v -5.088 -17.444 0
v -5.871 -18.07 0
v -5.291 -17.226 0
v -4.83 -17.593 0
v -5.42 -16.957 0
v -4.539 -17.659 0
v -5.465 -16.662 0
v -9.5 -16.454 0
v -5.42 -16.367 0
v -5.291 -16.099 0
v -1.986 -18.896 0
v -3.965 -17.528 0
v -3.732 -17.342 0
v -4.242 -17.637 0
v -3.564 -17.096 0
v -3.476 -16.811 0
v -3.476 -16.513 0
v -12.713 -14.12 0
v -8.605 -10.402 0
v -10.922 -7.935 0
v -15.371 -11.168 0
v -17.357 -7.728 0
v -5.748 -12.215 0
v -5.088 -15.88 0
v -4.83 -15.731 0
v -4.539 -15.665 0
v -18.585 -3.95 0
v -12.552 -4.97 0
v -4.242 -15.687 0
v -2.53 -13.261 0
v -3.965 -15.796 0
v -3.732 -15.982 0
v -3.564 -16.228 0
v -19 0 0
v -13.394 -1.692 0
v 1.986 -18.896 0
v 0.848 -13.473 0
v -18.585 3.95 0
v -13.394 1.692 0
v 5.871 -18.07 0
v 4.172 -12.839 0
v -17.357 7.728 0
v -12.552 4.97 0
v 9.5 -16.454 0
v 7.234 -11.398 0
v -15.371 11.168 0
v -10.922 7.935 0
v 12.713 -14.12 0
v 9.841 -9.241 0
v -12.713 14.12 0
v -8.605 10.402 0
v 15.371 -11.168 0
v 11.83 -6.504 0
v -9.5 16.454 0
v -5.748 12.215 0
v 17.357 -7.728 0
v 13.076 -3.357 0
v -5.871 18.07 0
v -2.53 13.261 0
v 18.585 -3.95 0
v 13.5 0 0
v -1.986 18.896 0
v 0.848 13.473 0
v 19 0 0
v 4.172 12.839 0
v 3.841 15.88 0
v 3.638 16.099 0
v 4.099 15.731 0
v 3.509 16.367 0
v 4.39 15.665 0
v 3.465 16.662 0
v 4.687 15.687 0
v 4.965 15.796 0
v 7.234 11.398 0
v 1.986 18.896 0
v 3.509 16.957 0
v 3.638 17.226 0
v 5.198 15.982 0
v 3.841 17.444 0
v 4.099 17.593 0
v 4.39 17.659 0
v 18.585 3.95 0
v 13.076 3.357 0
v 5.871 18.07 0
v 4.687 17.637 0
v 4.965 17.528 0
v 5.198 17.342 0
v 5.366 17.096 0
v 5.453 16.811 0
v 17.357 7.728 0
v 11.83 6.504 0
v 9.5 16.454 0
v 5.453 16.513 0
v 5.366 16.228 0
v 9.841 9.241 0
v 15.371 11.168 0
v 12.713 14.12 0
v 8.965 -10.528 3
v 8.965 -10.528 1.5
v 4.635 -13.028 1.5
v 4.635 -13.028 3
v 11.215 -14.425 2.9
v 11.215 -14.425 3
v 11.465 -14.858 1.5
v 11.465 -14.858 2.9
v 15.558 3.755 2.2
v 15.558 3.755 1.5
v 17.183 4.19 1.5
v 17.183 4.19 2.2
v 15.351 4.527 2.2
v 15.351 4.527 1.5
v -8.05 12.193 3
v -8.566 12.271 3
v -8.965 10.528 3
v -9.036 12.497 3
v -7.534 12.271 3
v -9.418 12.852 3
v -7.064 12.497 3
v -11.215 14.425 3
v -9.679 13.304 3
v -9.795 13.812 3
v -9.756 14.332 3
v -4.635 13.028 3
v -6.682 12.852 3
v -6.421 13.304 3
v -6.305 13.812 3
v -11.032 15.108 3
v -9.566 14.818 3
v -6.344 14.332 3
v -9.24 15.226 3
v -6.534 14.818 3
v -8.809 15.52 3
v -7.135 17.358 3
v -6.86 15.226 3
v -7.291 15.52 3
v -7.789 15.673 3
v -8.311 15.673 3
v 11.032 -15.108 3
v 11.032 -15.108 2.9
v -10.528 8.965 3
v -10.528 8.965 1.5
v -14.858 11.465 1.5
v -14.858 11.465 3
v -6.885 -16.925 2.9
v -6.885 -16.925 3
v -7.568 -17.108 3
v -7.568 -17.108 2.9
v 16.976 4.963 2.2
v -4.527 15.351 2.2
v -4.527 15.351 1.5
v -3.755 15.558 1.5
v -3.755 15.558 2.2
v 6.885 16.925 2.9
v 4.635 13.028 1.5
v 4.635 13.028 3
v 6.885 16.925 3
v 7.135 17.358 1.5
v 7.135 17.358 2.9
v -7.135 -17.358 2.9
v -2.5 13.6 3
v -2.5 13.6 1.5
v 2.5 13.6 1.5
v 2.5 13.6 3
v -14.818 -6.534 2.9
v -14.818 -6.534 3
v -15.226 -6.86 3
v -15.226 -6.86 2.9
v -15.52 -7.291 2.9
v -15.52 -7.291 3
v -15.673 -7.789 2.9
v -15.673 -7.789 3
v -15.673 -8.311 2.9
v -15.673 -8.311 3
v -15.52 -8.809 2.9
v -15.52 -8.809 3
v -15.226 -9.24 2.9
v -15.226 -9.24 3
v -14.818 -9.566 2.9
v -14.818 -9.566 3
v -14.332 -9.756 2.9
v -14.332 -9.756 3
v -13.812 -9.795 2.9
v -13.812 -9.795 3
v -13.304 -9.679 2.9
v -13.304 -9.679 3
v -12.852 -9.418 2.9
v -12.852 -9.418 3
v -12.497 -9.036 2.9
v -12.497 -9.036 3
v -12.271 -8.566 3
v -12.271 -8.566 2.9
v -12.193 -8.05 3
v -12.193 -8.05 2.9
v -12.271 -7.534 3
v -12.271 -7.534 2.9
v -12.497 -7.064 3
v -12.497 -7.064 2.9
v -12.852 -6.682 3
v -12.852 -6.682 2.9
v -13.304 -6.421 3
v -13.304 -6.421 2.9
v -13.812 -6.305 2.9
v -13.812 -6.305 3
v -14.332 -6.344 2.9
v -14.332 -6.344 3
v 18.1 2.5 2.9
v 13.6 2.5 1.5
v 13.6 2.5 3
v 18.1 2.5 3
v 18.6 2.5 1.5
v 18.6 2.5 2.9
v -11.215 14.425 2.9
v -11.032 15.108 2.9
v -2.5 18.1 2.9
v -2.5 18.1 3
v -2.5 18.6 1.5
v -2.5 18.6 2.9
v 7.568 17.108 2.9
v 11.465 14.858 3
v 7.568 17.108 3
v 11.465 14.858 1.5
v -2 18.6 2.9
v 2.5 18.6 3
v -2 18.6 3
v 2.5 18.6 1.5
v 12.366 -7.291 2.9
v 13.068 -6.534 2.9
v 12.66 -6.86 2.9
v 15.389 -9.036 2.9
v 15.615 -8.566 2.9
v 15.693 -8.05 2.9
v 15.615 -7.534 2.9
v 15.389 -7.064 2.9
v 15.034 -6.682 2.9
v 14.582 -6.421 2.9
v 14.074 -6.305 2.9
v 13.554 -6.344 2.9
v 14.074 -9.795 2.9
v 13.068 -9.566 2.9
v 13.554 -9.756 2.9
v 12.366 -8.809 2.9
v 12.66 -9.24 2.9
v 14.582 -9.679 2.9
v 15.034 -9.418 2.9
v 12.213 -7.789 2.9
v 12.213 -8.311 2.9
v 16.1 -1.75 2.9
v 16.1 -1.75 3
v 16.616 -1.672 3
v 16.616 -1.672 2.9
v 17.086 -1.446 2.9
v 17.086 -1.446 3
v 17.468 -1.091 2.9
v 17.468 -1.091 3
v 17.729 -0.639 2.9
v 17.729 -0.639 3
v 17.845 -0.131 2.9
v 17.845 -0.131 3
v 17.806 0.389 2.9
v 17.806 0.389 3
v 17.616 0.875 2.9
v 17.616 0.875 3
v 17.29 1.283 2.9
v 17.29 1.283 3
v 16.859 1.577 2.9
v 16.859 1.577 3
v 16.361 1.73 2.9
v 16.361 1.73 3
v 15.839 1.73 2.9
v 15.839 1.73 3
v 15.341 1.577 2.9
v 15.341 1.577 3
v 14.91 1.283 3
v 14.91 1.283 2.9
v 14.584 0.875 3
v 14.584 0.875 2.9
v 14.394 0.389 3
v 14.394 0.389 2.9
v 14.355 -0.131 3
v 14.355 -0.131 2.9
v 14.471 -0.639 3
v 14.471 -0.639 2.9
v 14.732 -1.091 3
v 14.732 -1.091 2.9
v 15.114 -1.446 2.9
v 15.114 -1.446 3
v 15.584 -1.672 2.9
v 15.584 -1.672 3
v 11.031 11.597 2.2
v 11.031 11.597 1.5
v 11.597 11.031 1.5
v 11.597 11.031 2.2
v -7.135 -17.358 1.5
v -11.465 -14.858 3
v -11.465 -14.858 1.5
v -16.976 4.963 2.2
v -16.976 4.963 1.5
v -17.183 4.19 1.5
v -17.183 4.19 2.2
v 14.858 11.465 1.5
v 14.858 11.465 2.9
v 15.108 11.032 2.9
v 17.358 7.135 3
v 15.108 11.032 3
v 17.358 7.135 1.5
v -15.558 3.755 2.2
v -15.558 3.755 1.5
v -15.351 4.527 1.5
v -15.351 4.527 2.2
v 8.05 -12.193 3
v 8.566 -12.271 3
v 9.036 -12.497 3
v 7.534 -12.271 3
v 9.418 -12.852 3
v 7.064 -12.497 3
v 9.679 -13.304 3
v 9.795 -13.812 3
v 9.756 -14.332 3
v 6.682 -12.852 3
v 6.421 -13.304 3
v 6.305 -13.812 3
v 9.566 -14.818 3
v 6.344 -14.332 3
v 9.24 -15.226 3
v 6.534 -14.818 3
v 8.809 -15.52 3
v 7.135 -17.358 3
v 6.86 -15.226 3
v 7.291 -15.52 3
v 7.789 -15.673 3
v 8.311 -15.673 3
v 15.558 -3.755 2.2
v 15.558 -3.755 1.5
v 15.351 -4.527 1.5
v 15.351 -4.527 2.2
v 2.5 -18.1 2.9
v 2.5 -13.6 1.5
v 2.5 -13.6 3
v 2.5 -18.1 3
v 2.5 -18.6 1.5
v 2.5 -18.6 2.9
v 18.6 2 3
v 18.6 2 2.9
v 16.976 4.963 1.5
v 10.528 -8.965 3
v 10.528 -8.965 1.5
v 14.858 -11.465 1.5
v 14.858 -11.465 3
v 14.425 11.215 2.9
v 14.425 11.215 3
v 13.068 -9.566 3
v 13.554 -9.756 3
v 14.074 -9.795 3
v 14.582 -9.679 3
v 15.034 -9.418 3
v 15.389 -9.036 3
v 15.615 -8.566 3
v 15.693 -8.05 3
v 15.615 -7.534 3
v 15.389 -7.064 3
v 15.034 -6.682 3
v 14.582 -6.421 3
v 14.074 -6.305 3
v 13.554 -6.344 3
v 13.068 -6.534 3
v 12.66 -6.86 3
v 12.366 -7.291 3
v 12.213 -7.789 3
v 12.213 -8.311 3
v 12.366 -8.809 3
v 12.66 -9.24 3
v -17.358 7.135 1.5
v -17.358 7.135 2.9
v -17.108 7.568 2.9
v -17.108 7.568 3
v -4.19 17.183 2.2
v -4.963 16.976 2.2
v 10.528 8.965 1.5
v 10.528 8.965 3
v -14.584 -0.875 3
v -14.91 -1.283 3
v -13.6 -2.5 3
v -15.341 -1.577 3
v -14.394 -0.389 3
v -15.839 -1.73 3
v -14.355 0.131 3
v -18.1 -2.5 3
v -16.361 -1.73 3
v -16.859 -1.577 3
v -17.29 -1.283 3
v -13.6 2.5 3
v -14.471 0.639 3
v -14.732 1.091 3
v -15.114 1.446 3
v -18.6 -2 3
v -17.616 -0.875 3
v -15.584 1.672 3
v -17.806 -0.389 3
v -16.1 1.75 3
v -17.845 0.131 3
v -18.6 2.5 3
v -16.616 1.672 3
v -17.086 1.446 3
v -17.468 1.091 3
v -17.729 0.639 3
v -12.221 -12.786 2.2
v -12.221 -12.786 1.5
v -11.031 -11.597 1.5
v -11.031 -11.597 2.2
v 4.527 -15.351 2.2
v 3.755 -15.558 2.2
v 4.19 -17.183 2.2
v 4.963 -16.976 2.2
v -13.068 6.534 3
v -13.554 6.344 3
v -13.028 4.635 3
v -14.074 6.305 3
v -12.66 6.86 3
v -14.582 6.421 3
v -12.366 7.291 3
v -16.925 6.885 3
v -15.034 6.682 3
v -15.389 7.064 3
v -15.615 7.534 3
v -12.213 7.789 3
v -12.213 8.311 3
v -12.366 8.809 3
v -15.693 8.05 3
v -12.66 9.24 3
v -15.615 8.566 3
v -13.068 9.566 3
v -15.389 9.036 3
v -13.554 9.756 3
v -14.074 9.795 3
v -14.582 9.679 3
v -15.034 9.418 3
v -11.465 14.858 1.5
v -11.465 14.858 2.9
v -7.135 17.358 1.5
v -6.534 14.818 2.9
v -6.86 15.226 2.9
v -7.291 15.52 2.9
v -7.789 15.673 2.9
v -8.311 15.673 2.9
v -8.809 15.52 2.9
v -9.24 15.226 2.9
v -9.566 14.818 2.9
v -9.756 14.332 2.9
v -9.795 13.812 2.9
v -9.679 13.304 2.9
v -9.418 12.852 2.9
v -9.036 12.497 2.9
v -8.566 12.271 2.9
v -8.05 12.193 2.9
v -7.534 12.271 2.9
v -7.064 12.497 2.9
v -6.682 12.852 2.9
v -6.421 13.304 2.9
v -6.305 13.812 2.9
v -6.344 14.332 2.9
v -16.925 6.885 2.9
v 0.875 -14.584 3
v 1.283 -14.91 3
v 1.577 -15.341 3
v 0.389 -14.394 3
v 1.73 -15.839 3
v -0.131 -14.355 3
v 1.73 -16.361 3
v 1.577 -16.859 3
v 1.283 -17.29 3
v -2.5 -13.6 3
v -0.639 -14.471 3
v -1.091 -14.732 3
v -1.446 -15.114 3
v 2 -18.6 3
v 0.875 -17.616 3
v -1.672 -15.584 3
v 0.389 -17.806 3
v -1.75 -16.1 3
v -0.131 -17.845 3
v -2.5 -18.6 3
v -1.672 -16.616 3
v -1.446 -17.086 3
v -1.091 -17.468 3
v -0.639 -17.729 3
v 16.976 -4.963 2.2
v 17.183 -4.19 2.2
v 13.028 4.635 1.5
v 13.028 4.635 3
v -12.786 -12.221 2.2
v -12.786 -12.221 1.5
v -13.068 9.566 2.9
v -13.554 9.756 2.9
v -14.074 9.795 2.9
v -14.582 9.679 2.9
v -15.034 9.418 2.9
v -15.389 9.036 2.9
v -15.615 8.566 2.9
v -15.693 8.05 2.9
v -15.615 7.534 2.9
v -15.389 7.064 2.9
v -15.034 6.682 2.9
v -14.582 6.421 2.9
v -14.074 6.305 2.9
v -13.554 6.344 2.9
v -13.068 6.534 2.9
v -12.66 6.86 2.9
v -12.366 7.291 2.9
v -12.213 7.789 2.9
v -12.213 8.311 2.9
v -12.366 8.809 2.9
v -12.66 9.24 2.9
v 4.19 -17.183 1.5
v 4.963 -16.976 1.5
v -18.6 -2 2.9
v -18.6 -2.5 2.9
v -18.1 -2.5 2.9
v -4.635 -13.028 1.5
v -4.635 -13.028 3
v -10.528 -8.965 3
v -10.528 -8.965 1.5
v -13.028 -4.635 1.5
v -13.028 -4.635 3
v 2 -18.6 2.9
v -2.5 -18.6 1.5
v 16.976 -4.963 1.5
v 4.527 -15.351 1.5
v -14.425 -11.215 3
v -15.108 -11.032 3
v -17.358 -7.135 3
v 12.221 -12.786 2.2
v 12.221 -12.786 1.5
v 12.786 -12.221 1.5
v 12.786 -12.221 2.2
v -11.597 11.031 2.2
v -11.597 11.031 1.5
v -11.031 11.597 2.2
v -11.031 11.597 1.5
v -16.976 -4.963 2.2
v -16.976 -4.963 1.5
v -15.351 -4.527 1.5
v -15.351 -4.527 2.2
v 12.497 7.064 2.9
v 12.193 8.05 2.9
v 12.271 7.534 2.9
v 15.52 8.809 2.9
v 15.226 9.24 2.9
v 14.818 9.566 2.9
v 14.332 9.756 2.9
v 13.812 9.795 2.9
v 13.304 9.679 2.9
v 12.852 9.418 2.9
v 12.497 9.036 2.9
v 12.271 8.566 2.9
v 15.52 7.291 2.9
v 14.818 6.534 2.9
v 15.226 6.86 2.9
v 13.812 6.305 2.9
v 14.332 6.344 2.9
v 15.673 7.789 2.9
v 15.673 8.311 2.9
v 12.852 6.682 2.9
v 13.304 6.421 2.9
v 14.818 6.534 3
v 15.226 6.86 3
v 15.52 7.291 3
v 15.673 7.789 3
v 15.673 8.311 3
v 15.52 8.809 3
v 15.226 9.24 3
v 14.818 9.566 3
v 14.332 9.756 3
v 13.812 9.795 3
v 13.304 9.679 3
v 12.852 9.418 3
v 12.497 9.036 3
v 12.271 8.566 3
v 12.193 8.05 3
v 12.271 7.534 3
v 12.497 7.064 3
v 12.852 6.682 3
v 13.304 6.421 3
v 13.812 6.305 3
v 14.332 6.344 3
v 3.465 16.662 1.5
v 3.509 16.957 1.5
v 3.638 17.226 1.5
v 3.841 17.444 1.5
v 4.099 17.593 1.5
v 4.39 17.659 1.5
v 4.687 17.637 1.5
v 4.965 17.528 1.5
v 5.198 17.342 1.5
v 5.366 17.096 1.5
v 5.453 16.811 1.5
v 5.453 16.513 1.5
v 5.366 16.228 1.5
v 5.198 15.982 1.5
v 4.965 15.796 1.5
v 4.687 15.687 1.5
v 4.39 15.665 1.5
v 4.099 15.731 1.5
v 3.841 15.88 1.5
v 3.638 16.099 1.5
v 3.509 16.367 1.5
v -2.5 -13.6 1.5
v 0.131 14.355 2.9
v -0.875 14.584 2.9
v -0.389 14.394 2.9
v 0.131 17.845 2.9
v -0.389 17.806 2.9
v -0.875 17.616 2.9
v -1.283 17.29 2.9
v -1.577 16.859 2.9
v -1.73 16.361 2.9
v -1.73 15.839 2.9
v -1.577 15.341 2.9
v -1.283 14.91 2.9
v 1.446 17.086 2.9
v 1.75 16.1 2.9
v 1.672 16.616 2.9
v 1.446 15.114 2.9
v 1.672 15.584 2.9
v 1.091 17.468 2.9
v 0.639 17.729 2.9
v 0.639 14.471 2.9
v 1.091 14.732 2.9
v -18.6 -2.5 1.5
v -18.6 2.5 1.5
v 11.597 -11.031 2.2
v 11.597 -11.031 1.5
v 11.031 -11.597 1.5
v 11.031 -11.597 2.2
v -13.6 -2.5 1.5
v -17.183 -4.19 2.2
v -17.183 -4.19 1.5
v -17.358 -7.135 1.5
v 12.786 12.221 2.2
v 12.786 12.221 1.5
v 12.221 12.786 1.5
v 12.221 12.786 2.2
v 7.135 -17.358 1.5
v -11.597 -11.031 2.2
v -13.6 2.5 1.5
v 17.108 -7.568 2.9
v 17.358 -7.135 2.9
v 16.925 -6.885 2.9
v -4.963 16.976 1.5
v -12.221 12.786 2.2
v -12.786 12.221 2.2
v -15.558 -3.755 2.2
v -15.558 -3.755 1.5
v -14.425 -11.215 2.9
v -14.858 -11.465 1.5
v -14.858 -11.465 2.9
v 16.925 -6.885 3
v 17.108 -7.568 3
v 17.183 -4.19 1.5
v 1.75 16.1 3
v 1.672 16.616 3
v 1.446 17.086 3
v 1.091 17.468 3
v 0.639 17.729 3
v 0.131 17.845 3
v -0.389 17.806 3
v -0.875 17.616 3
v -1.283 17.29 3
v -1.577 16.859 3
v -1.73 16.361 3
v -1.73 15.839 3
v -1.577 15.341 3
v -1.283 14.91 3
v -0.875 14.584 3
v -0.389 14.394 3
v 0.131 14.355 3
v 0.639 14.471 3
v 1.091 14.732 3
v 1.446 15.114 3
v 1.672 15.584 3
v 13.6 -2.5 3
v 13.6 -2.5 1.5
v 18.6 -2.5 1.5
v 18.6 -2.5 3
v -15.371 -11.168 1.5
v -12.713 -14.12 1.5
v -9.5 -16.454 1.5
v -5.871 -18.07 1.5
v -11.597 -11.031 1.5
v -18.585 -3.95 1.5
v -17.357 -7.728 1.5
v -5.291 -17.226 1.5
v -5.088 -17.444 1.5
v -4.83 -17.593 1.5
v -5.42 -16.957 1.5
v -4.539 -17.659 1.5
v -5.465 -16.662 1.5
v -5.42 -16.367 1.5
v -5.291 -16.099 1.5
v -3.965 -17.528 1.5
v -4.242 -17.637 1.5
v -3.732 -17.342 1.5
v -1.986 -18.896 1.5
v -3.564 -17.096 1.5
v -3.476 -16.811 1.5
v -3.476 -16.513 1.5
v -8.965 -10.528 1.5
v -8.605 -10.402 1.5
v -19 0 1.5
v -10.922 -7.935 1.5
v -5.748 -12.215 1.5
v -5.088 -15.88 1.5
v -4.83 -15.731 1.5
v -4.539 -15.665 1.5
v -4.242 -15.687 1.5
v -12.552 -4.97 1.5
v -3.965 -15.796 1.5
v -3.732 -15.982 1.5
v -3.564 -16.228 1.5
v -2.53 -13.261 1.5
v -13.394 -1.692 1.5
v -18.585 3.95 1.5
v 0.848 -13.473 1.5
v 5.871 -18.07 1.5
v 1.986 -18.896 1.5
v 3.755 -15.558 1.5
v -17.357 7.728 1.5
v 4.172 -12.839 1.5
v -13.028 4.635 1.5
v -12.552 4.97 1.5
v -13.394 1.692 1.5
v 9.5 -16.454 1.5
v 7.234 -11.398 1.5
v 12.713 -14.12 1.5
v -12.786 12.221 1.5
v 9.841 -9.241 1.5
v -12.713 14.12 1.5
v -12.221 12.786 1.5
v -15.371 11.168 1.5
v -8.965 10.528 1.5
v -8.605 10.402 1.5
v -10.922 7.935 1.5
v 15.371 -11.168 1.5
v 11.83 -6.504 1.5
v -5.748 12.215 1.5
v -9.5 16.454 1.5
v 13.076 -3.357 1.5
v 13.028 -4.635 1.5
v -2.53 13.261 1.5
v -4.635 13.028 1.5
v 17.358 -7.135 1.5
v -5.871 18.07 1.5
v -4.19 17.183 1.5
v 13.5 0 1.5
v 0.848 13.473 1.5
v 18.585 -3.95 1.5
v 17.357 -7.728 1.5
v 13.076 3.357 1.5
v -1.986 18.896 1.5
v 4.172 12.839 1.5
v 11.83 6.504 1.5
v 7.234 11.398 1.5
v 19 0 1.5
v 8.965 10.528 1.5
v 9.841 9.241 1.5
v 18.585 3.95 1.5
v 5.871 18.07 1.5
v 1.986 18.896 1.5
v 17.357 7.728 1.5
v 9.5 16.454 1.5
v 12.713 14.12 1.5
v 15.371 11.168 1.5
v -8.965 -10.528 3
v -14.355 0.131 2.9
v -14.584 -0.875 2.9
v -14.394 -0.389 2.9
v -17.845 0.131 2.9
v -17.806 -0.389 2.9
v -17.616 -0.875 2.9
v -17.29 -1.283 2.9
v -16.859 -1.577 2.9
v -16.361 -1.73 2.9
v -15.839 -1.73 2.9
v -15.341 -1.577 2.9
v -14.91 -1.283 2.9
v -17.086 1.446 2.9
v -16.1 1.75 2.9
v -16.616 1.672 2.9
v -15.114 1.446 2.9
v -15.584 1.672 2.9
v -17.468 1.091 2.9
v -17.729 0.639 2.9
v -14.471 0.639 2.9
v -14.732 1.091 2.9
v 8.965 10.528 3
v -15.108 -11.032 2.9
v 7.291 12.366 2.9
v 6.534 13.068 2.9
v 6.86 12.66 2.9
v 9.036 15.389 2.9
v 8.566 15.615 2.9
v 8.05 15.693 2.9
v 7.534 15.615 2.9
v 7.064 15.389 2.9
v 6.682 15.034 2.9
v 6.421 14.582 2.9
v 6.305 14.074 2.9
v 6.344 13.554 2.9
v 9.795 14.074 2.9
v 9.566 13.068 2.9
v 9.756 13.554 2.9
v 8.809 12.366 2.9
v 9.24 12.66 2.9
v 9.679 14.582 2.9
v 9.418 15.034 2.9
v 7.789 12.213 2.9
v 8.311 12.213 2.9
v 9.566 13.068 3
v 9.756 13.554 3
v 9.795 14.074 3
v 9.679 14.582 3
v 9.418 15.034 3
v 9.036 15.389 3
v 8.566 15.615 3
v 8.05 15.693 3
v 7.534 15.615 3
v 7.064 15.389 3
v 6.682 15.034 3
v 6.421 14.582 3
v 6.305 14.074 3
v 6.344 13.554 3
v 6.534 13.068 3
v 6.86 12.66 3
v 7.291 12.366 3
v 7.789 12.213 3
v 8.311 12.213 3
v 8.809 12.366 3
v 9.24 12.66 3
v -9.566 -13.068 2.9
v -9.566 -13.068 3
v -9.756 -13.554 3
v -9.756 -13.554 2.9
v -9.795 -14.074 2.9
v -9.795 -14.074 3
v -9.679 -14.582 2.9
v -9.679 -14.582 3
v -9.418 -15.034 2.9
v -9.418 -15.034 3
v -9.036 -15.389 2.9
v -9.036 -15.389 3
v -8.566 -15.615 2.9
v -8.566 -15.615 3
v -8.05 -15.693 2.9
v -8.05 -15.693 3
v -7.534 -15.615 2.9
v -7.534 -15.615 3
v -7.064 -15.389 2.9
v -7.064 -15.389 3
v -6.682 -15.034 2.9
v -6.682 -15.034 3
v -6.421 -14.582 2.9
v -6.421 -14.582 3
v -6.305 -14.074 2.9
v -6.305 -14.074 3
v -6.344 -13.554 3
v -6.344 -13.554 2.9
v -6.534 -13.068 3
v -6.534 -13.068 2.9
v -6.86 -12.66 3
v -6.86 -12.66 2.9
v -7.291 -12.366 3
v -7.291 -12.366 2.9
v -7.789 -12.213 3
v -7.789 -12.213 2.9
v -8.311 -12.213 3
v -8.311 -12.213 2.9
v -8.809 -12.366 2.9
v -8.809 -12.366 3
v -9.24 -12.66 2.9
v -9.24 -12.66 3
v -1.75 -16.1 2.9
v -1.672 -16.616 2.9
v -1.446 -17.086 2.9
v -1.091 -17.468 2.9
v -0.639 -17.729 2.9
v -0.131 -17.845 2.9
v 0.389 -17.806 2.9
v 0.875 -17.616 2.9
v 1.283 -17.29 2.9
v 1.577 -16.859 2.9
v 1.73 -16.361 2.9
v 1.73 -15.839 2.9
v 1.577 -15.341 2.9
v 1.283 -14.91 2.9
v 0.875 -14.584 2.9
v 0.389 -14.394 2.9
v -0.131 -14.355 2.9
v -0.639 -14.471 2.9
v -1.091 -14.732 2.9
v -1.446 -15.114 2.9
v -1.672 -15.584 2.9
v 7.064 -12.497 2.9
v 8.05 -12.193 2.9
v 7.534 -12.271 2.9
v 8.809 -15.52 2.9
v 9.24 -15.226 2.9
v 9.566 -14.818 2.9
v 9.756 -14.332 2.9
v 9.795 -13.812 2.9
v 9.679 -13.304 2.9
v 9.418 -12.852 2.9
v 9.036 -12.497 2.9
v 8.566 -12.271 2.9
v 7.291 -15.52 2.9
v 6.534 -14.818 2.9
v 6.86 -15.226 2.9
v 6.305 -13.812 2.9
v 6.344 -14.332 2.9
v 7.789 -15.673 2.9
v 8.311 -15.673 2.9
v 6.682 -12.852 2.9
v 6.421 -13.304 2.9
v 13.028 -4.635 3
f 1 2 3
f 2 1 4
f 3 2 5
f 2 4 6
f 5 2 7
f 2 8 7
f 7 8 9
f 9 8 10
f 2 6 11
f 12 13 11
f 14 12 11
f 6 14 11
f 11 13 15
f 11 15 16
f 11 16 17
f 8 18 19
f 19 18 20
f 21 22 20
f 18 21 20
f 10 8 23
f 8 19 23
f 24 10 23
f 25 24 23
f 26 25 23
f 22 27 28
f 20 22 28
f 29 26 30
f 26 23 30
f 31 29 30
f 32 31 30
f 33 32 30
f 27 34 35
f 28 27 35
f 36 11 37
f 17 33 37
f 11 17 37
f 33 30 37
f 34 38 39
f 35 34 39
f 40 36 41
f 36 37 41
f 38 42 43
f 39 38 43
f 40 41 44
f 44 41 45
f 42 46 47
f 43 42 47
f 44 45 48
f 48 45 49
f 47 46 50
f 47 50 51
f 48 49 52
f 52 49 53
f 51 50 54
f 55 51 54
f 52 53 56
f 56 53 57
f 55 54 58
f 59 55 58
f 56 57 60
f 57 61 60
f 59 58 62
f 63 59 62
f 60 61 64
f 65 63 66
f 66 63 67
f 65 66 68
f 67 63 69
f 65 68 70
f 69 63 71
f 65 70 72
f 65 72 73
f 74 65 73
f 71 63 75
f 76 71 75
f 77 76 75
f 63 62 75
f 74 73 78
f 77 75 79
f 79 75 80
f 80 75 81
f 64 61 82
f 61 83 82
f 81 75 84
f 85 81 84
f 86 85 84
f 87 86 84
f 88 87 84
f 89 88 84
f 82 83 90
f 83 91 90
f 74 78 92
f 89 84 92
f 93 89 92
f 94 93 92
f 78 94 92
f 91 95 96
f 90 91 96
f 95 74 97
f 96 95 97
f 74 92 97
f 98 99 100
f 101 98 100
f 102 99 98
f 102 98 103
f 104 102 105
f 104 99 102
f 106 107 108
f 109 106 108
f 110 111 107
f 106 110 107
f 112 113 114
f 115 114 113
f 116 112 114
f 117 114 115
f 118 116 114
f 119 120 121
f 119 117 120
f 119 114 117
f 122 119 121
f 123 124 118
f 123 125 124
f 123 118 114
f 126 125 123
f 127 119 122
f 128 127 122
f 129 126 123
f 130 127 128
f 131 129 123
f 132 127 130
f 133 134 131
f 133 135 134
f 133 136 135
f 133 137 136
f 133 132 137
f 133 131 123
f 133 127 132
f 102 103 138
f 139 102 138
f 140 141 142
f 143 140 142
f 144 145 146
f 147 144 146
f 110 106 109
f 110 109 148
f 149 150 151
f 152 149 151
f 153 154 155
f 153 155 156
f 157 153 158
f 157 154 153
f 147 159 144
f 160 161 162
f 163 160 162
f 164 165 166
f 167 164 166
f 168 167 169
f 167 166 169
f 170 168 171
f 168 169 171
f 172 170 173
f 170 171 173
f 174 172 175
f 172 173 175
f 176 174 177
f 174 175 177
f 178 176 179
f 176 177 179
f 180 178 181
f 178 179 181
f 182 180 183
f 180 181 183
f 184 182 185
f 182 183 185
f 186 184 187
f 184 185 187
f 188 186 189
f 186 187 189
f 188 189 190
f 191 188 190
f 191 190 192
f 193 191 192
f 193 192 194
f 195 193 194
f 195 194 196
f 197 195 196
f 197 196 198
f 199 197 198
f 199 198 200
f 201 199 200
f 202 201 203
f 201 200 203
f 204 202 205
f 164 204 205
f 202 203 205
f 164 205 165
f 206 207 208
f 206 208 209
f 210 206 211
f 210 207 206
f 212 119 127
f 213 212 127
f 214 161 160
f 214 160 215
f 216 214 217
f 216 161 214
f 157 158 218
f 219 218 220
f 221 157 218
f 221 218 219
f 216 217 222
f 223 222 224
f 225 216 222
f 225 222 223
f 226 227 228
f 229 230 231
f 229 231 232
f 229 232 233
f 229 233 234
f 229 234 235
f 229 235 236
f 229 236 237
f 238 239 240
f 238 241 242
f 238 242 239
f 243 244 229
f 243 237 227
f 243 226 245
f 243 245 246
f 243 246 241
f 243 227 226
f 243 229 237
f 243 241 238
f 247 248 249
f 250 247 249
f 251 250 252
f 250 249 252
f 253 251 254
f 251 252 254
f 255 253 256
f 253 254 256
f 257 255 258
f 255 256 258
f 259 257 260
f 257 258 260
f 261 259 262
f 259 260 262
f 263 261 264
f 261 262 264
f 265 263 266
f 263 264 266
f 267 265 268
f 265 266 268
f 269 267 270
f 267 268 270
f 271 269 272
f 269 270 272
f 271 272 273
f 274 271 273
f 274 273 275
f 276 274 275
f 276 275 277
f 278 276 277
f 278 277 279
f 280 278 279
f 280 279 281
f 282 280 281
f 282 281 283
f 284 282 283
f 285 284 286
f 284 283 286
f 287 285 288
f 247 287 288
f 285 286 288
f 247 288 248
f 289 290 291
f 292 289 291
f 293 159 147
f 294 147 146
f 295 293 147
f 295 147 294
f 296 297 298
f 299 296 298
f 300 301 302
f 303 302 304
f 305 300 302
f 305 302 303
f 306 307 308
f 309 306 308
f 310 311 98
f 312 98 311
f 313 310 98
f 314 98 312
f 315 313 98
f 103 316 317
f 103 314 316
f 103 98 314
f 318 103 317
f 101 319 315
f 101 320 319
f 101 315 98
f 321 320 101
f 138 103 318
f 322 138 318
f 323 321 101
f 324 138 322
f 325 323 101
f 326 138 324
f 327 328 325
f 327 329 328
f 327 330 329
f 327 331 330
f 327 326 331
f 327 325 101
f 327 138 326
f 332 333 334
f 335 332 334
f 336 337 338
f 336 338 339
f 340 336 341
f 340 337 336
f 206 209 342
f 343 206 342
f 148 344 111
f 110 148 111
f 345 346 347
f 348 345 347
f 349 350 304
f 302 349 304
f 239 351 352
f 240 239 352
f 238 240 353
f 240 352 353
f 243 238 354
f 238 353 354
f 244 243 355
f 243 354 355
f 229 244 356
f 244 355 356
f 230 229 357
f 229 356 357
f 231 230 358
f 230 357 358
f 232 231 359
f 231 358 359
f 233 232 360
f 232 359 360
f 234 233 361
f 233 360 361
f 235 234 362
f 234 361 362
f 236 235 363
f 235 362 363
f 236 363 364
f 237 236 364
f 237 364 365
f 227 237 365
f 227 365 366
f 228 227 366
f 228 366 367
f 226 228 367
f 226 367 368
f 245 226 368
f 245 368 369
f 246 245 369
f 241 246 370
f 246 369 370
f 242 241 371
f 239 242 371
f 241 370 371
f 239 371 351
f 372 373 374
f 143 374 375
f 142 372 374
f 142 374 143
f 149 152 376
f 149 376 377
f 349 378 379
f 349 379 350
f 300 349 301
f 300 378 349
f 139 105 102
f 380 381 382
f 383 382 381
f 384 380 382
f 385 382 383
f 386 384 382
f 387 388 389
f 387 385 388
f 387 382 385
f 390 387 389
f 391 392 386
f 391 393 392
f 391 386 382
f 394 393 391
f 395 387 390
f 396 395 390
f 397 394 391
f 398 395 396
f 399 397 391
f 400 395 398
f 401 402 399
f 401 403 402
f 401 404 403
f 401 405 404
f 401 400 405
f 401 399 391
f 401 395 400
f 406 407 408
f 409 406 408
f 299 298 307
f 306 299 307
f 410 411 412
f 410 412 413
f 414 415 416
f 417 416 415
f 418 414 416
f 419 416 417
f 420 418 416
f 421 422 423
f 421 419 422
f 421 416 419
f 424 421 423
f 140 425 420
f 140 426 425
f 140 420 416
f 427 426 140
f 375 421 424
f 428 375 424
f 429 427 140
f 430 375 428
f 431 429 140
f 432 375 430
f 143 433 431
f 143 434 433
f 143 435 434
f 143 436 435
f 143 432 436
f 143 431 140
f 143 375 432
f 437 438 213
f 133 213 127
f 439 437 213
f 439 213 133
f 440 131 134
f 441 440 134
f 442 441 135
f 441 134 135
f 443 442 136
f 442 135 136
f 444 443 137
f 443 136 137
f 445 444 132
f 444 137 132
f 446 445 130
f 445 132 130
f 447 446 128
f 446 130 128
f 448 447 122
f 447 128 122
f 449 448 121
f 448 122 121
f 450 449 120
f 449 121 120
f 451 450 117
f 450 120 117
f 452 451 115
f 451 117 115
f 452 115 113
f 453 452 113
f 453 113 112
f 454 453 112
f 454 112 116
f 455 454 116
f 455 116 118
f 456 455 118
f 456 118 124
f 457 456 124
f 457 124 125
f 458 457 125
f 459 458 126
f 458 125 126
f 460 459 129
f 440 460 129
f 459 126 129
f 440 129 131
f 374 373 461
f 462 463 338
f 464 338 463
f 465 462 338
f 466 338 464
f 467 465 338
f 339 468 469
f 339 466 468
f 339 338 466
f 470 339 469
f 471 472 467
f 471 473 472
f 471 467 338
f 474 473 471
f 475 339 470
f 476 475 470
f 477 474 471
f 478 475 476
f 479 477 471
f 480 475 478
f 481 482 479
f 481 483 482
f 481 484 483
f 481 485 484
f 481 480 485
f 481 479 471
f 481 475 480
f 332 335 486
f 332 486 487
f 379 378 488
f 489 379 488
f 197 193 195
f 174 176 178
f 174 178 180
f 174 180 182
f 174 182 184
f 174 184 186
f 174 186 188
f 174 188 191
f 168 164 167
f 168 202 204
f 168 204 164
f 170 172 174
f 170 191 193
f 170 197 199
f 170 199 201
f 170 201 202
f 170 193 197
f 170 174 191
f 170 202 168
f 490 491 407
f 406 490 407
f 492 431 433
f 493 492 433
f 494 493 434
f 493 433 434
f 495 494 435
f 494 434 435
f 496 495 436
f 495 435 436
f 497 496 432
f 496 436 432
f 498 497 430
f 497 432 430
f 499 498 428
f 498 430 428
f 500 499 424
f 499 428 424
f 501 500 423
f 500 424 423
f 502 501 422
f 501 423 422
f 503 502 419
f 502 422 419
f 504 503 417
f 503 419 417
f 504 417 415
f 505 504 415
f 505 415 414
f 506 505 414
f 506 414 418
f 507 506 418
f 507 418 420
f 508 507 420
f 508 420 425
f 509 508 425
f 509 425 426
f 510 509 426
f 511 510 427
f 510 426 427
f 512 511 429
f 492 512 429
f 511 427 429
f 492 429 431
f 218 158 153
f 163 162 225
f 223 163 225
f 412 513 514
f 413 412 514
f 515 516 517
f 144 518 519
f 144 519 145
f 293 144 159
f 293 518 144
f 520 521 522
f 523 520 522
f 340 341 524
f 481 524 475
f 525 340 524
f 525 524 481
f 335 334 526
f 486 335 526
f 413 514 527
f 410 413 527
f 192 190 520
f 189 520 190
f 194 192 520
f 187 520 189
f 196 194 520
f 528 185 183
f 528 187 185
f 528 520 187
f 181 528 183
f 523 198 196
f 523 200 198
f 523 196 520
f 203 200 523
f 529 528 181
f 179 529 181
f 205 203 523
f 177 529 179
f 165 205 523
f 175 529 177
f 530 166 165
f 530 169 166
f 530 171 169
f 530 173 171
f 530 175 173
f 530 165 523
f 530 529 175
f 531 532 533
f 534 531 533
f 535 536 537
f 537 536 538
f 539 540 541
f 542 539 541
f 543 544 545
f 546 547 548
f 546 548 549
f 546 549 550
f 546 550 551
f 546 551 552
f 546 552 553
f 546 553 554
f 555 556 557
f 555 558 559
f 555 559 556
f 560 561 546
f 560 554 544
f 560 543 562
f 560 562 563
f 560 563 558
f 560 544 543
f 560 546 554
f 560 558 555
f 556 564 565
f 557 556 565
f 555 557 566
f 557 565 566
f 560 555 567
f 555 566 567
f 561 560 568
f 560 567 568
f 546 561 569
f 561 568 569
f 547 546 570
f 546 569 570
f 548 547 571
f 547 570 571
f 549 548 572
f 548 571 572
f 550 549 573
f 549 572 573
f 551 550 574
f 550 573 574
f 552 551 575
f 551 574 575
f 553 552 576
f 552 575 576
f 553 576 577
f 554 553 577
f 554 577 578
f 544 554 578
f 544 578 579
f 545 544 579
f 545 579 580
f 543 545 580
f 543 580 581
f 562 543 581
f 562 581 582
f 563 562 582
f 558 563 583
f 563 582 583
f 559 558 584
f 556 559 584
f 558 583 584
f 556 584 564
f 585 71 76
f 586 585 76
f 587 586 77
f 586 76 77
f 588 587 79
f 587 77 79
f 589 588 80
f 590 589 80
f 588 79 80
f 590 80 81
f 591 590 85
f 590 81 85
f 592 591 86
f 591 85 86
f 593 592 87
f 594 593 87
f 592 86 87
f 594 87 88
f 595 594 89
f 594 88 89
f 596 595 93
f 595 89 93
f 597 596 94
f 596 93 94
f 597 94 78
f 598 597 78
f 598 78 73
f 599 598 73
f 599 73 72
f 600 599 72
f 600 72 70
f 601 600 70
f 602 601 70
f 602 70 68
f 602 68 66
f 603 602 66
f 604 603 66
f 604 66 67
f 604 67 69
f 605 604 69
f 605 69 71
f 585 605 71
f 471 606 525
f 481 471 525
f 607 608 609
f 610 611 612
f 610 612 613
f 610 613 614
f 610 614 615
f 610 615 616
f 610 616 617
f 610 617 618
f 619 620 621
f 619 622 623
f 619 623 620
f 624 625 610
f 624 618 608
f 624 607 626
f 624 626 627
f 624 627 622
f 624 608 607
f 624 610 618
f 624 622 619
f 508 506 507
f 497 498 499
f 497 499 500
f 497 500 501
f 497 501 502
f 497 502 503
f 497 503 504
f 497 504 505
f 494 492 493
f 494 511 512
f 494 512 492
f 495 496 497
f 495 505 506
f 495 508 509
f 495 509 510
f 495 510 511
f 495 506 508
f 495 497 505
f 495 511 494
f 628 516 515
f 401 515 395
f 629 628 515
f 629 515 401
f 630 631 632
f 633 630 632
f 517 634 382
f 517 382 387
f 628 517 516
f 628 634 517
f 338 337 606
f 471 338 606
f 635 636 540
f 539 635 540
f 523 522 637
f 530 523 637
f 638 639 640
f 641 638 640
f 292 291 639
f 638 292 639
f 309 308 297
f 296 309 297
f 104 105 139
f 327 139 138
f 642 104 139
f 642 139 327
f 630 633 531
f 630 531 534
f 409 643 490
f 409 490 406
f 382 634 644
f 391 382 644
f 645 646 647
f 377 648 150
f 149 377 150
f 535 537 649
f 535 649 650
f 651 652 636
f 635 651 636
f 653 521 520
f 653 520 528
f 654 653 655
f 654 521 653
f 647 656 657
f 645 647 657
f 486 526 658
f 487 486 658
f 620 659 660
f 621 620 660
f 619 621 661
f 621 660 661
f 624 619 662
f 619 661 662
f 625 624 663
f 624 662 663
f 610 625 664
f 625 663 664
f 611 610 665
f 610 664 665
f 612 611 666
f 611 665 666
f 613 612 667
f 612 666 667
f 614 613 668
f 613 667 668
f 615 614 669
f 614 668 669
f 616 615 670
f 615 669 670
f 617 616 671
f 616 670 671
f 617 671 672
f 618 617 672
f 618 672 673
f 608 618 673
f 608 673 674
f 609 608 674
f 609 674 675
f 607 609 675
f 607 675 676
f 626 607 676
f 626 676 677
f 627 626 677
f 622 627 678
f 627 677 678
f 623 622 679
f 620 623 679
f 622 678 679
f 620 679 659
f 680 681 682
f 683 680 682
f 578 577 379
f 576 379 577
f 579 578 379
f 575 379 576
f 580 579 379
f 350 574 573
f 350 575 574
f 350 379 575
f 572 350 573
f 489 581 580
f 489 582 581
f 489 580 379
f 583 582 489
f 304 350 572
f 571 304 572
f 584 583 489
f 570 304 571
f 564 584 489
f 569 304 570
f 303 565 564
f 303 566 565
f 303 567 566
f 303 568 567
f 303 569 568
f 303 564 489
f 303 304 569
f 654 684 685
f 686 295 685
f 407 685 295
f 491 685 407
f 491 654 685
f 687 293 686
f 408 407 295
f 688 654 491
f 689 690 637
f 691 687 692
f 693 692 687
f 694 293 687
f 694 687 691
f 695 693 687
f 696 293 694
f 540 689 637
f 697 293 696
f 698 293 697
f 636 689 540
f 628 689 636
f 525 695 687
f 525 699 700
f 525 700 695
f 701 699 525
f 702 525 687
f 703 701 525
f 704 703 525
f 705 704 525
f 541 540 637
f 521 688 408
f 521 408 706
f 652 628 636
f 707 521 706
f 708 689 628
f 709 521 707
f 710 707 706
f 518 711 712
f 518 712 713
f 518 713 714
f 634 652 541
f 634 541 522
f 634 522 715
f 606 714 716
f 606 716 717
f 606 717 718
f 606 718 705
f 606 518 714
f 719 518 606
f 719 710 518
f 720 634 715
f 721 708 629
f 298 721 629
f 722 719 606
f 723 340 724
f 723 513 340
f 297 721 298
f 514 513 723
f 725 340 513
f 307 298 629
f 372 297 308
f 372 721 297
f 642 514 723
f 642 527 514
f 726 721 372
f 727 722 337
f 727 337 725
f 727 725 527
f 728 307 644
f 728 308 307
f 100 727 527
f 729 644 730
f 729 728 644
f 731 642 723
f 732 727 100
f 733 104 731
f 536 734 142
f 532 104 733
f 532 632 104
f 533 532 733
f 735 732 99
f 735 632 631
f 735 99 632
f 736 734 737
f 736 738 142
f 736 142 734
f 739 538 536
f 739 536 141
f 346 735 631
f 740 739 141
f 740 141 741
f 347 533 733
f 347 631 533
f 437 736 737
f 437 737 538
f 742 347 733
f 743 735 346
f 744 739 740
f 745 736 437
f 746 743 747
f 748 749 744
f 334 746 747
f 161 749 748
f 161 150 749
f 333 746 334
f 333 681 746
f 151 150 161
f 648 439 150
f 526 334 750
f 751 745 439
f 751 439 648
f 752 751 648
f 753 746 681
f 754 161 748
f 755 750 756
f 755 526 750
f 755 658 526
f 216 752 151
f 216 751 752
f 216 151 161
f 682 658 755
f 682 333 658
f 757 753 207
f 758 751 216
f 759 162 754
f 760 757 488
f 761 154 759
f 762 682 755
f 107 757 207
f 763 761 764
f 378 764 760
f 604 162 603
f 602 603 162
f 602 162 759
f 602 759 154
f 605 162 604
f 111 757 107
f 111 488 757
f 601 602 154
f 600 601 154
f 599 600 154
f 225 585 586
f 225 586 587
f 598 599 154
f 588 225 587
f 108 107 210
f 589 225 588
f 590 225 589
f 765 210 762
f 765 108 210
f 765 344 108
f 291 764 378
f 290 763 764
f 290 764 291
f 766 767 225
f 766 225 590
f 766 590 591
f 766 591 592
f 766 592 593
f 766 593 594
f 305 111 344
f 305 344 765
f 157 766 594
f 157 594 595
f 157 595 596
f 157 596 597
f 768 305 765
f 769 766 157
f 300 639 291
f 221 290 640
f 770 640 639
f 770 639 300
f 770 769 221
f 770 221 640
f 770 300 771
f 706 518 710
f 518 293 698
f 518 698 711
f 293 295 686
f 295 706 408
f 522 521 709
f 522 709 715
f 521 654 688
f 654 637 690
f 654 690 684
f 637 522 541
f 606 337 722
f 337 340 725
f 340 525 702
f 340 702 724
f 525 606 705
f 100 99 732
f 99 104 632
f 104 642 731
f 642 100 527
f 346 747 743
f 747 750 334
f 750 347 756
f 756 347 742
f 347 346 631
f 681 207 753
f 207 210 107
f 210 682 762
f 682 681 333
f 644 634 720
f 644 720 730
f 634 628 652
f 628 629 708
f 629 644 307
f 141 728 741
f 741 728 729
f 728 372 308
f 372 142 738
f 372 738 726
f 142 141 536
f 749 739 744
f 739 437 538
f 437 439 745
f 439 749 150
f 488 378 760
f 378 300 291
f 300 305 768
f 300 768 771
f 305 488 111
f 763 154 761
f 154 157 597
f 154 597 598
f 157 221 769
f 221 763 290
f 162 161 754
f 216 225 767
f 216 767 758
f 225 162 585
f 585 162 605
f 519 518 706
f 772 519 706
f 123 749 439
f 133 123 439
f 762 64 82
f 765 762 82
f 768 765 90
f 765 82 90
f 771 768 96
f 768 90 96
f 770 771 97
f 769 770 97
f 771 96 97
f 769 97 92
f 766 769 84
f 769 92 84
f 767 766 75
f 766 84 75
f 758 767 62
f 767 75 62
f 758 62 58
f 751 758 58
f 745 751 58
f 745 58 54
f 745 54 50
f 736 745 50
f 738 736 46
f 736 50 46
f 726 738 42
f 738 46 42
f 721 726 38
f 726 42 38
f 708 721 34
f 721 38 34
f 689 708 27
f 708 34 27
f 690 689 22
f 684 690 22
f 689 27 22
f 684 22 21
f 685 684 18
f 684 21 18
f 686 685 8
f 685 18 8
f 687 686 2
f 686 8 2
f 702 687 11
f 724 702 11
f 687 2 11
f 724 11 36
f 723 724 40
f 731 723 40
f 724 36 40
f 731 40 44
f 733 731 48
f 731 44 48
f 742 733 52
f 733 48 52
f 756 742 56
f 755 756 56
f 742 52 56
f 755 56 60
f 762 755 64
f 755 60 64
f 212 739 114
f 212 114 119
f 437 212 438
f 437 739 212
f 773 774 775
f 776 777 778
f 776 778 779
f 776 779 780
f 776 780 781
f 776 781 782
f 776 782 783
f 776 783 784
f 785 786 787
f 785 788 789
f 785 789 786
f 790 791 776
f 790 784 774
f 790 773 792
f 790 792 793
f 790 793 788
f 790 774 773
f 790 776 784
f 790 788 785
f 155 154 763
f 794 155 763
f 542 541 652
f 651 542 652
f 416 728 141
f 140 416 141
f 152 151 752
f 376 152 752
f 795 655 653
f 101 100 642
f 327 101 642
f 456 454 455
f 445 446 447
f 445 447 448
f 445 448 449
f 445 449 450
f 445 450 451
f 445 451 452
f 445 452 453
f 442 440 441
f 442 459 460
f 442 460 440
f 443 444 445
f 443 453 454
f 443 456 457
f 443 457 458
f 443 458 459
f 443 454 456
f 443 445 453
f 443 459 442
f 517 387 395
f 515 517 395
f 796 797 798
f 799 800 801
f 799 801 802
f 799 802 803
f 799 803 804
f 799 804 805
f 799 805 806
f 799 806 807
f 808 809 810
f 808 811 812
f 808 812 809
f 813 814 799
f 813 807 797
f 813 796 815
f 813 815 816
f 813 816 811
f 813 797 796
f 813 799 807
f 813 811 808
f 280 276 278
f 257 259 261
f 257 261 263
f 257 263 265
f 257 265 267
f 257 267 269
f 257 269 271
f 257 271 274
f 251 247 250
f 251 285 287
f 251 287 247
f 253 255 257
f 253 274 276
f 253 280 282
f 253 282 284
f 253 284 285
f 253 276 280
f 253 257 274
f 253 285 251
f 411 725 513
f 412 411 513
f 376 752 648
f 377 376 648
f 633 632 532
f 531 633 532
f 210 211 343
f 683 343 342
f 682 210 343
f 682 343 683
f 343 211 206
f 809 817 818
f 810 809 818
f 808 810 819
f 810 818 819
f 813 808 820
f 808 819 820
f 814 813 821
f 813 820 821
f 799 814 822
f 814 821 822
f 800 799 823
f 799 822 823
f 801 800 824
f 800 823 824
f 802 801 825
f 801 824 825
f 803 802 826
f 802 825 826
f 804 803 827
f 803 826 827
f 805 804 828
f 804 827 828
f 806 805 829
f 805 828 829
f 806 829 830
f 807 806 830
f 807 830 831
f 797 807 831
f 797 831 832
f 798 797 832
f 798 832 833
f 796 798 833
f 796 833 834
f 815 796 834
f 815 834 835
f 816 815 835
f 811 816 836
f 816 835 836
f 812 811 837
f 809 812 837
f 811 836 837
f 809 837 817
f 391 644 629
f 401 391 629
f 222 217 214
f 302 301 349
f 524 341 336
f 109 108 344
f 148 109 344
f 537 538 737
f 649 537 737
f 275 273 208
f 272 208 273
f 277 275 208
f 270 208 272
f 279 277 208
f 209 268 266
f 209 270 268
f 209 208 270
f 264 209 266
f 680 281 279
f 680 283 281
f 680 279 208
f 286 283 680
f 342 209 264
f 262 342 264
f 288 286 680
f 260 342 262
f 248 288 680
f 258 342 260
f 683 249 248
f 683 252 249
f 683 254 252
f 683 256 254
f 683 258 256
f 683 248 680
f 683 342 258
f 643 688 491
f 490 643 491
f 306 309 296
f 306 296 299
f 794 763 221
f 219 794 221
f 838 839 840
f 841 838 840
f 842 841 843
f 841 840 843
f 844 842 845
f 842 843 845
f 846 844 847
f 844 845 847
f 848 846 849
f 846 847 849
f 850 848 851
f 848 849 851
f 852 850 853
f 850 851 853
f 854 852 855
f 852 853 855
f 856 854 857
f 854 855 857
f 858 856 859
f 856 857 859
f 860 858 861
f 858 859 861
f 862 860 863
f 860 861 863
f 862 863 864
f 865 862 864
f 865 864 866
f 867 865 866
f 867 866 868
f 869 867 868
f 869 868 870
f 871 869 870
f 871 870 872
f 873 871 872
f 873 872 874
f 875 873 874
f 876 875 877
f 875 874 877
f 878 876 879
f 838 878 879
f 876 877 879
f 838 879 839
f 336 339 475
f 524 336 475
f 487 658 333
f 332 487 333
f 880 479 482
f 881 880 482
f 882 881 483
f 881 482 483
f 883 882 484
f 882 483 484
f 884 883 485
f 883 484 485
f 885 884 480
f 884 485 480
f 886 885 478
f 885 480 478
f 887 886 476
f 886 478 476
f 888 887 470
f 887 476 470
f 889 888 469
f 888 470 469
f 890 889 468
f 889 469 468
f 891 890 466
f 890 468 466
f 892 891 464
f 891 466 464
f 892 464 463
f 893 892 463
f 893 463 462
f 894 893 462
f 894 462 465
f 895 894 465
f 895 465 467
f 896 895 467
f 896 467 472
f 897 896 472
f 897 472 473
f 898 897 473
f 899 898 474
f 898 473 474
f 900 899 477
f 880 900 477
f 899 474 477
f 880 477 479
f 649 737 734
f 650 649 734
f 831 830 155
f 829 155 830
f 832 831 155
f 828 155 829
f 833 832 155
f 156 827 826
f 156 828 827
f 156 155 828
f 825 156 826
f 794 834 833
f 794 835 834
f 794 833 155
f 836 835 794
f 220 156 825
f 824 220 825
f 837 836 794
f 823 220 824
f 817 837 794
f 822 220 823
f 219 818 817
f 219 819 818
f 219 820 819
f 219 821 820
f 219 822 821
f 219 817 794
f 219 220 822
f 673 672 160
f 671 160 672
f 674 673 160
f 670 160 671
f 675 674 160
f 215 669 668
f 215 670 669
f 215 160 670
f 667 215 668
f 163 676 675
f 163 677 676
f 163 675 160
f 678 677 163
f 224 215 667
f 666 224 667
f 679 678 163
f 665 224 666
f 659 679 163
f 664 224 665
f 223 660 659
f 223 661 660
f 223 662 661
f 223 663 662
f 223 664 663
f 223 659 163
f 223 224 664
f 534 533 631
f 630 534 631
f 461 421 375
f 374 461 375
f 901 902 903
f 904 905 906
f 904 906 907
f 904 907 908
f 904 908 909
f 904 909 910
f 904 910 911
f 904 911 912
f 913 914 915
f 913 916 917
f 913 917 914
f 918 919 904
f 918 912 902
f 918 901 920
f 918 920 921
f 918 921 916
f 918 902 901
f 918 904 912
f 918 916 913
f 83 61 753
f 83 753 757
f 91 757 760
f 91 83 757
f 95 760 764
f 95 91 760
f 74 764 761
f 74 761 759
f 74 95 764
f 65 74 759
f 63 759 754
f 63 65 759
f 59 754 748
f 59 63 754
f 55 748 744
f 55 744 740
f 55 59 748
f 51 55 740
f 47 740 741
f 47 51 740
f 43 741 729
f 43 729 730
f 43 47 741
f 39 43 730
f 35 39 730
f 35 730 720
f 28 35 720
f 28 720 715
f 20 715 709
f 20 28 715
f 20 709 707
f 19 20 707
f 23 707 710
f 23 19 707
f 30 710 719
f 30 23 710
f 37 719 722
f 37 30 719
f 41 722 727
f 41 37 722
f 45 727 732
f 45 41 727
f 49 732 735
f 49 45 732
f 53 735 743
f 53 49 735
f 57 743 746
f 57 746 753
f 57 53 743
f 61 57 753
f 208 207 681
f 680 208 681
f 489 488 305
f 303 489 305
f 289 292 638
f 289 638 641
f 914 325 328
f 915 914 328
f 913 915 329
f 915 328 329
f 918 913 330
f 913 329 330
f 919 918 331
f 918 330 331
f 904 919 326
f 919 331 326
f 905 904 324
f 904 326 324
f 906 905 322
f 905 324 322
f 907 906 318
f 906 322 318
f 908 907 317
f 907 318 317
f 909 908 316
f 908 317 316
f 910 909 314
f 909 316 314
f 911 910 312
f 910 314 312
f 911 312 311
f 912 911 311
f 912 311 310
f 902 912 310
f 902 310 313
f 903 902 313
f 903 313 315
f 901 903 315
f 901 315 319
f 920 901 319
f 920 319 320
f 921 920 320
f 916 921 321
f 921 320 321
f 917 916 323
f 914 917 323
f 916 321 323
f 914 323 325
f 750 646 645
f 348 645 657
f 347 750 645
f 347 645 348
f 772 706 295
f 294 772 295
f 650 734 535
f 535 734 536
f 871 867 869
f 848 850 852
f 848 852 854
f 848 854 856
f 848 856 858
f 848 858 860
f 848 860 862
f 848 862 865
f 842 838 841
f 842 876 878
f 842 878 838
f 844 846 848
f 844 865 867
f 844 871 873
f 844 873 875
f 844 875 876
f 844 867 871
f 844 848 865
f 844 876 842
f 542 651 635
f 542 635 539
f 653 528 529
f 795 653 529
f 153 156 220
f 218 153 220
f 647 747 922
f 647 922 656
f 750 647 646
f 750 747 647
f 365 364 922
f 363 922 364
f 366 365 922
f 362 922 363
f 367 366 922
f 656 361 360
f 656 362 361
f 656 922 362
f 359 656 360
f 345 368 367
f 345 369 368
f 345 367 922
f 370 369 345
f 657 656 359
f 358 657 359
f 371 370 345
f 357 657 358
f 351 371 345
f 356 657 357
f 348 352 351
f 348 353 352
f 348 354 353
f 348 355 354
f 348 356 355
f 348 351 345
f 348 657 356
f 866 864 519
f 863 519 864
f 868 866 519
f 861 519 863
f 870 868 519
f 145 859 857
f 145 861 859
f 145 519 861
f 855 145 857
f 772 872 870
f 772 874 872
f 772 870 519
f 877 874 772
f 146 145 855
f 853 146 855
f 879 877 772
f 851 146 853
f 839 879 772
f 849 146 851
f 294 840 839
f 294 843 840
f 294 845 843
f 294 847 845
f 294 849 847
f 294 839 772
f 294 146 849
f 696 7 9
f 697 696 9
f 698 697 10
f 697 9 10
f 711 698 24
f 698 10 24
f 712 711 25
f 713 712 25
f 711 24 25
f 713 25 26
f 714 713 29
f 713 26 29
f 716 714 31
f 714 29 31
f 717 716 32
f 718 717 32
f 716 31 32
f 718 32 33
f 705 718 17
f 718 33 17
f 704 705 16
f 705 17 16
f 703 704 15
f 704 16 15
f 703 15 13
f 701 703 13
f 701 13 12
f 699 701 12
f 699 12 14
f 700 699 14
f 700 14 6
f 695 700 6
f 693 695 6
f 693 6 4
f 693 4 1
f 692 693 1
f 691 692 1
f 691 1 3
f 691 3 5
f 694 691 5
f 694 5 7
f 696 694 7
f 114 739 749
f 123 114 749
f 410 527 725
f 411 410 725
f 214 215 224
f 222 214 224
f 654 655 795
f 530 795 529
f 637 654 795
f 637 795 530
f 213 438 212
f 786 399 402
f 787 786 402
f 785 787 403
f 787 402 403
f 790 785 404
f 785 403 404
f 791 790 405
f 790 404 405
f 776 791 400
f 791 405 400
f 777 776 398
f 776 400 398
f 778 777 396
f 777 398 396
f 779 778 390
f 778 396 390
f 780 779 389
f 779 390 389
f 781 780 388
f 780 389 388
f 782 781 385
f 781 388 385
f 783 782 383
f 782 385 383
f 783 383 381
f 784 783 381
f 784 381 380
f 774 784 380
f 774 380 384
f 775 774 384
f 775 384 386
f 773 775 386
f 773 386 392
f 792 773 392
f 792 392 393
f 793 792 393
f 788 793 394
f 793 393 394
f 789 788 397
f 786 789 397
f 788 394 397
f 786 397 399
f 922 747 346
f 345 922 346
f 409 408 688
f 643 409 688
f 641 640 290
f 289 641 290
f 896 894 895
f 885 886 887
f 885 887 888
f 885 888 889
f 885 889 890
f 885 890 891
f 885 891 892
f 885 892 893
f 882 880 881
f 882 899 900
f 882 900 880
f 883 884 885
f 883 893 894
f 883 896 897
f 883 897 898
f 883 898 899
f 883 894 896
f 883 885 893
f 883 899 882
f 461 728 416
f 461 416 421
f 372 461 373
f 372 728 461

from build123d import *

# Parameters (mm, degrees)
SKETCH_1_R                      = 19
SKETCH_1_R_2                    = 13.5
EXTRUDE_1_DEPTH                 = 1.5
SKETCH_2_W                      = 5
SKETCH_2_H                      = 5
EXTRUDE_2_DEPTH                 = 1.5
PATTERN_CIRCULAR_2_COUNT        = 12
SKETCH_6_R                      = 1.75
CUT_EXTRUDE_1_DEPTH             = 0.1
PATTERN_CIRCULAR_3_COUNT        = 12
SKETCH_7_R                      = 1
CUT_EXTRUDE_2_DEPTH             = 28.037011669
EXTRUDE_3_DEPTH                 = 0.7
PATTERN_CIRCULAR_4_COUNT        = 5
PATTERN_CIRCULAR_4_ANGLE        = 120
PATTERN_CIRCULAR_5_COUNT        = 2
PATTERN_CIRCULAR_5_ANGLE        = 60
PATTERN_CIRCULAR_6_COUNT        = 5
PATTERN_CIRCULAR_6_ANGLE        = 120
PATTERN_CIRCULAR_6_COPY_1_DEPTH = 0.7
PATTERN_CIRCULAR_6_COPY_2_DEPTH = 0.7
PATTERN_CIRCULAR_6_COPY_3_DEPTH = 0.7


with BuildPart() as part:
    # ｽｹｯﾁ1 → ﾎﾞｽ - 押し出し1 (new body)
    with BuildSketch(Plane.XY):
        Circle(SKETCH_1_R)
        Circle(SKETCH_1_R_2, mode=Mode.SUBTRACT)
    extrude(amount=EXTRUDE_1_DEPTH)

    # ｽｹｯﾁ2 → ﾎﾞｽ - 押し出し2 (add)
    with BuildSketch(Plane.XY.offset(1.5)):
        with Locations((0, 16.1)):
            Rectangle(SKETCH_2_W, SKETCH_2_H)
    extrude_2 = extrude(amount=EXTRUDE_2_DEPTH)

    # 円形ﾊﾟﾀｰﾝ2: ﾎﾞｽ - 押し出し2 ×12 about axis
    pattern_circular_2_axis = Axis((0, 0, 0), (0, 0, 1))
    for i in range(1, PATTERN_CIRCULAR_2_COUNT):
        add(extrude_2.rotate(pattern_circular_2_axis, i * 360 / PATTERN_CIRCULAR_2_COUNT))

    # ｽｹｯﾁ6 → ｶｯﾄ - 押し出し1 (cut)
    with BuildSketch(Plane.XY.offset(3)):
        with Locations((0, 16.1)):
            Circle(SKETCH_6_R)
        Polygon((-2.5, 18.1), (-2, 18.6), (-2.5, 18.6), align=None)
    cut_extrude_1 = extrude(amount=-CUT_EXTRUDE_1_DEPTH, mode=Mode.SUBTRACT)

    # 円形ﾊﾟﾀｰﾝ3: ｶｯﾄ - 押し出し1 ×12 about axis
    pattern_circular_3_axis = Axis((0, 0, 0), (0, 0, 1))
    for i in range(1, PATTERN_CIRCULAR_3_COUNT):
        add(cut_extrude_1.rotate(pattern_circular_3_axis, i * 360 / PATTERN_CIRCULAR_3_COUNT), mode=Mode.SUBTRACT)

    # ｽｹｯﾁ7 → ｶｯﾄ - 押し出し2 (cut, through all)
    with BuildSketch(Plane(origin=(0, 0, 0), x_dir=(-1, 0, 0), z_dir=(0, 0, -1))):
        with Locations((4.464628528, -16.662220503)):
            Circle(SKETCH_7_R)
        with Locations((-4.464628528, 16.662220503)):
            Circle(SKETCH_7_R)
    extrude(amount=-CUT_EXTRUDE_2_DEPTH, mode=Mode.SUBTRACT)

    # ｽｹｯﾁ8 → ﾎﾞｽ - 押し出し3 (add)
    with BuildSketch(Plane.XY.offset(1.5)):
        Polygon((4.527475052, -15.351285603), (3.754734391, -15.558340839), (4.190189437, -17.183481193), (4.962930098, -16.976425957), align=None)
    extrude_3 = extrude(amount=EXTRUDE_3_DEPTH)

    # 円形ﾊﾟﾀｰﾝ4: ﾎﾞｽ - 押し出し3 ×5 about axis
    pattern_circular_4_axis = Axis((0, 0, 0), (0, 0, 1))
    for i in range(1, PATTERN_CIRCULAR_4_COUNT):
        add(extrude_3.rotate(pattern_circular_4_axis, i * PATTERN_CIRCULAR_4_ANGLE / (PATTERN_CIRCULAR_4_COUNT - 1)))

    # 円形ﾊﾟﾀｰﾝ5: ﾎﾞｽ - 押し出し3 ×2 about axis
    pattern_circular_5_axis = Axis((0, 0, 0), (0, 0, -1))
    for i in range(1, PATTERN_CIRCULAR_5_COUNT):
        add(extrude_3.rotate(pattern_circular_5_axis, i * PATTERN_CIRCULAR_5_ANGLE / (PATTERN_CIRCULAR_5_COUNT - 1)))

    # 円形ﾊﾟﾀｰﾝ6: ﾎﾞｽ - 押し出し3 ×5 about axis, 1 skipped
    pattern_circular_6_axis = Axis((0, 0, 1.5), (0, 0, -1))
    add([extrude_3.rotate(pattern_circular_6_axis, i * PATTERN_CIRCULAR_6_ANGLE / (PATTERN_CIRCULAR_6_COUNT - 1)) for i in range(1, PATTERN_CIRCULAR_6_COUNT) if i not in (1,)])

    # 円形ﾊﾟﾀｰﾝ6 copy 1 sketch → 円形ﾊﾟﾀｰﾝ6 copy 1 (add)
    with BuildSketch(Plane(origin=(0, 0, 1.5), x_dir=(-0.5000000000000044, -0.866025403784436, 0), z_dir=(0, 0, 1))):
        Polygon((4.527475052, -15.351285603), (3.754734391, -15.558340839), (4.190189437, -17.183481193), (4.962930098, -16.976425957), align=None)
    extrude(amount=PATTERN_CIRCULAR_6_COPY_1_DEPTH)

    # 円形ﾊﾟﾀｰﾝ6 copy 2 sketch → 円形ﾊﾟﾀｰﾝ6 copy 2 (add)
    with BuildSketch(Plane(origin=(0, 0, 1.5), x_dir=(-0.8660254037844418, -0.49999999999999456, 0), z_dir=(0, 0, 1))):
        Polygon((4.527475052, -15.351285603), (3.754734391, -15.558340839), (4.190189437, -17.183481193), (4.962930098, -16.976425957), align=None)
    extrude(amount=PATTERN_CIRCULAR_6_COPY_2_DEPTH)

    # 円形ﾊﾟﾀｰﾝ6 copy 3 sketch → 円形ﾊﾟﾀｰﾝ6 copy 3 (add)
    with BuildSketch(Plane(origin=(0, 0, 1.5), x_dir=(-1, 0, 0), z_dir=(0, 0, 1))):
        Polygon((4.527475052, -15.351285603), (3.754734391, -15.558340839), (4.190189437, -17.183481193), (4.962930098, -16.976425957), align=None)
    extrude(amount=PATTERN_CIRCULAR_6_COPY_3_DEPTH)


solid = part.part
